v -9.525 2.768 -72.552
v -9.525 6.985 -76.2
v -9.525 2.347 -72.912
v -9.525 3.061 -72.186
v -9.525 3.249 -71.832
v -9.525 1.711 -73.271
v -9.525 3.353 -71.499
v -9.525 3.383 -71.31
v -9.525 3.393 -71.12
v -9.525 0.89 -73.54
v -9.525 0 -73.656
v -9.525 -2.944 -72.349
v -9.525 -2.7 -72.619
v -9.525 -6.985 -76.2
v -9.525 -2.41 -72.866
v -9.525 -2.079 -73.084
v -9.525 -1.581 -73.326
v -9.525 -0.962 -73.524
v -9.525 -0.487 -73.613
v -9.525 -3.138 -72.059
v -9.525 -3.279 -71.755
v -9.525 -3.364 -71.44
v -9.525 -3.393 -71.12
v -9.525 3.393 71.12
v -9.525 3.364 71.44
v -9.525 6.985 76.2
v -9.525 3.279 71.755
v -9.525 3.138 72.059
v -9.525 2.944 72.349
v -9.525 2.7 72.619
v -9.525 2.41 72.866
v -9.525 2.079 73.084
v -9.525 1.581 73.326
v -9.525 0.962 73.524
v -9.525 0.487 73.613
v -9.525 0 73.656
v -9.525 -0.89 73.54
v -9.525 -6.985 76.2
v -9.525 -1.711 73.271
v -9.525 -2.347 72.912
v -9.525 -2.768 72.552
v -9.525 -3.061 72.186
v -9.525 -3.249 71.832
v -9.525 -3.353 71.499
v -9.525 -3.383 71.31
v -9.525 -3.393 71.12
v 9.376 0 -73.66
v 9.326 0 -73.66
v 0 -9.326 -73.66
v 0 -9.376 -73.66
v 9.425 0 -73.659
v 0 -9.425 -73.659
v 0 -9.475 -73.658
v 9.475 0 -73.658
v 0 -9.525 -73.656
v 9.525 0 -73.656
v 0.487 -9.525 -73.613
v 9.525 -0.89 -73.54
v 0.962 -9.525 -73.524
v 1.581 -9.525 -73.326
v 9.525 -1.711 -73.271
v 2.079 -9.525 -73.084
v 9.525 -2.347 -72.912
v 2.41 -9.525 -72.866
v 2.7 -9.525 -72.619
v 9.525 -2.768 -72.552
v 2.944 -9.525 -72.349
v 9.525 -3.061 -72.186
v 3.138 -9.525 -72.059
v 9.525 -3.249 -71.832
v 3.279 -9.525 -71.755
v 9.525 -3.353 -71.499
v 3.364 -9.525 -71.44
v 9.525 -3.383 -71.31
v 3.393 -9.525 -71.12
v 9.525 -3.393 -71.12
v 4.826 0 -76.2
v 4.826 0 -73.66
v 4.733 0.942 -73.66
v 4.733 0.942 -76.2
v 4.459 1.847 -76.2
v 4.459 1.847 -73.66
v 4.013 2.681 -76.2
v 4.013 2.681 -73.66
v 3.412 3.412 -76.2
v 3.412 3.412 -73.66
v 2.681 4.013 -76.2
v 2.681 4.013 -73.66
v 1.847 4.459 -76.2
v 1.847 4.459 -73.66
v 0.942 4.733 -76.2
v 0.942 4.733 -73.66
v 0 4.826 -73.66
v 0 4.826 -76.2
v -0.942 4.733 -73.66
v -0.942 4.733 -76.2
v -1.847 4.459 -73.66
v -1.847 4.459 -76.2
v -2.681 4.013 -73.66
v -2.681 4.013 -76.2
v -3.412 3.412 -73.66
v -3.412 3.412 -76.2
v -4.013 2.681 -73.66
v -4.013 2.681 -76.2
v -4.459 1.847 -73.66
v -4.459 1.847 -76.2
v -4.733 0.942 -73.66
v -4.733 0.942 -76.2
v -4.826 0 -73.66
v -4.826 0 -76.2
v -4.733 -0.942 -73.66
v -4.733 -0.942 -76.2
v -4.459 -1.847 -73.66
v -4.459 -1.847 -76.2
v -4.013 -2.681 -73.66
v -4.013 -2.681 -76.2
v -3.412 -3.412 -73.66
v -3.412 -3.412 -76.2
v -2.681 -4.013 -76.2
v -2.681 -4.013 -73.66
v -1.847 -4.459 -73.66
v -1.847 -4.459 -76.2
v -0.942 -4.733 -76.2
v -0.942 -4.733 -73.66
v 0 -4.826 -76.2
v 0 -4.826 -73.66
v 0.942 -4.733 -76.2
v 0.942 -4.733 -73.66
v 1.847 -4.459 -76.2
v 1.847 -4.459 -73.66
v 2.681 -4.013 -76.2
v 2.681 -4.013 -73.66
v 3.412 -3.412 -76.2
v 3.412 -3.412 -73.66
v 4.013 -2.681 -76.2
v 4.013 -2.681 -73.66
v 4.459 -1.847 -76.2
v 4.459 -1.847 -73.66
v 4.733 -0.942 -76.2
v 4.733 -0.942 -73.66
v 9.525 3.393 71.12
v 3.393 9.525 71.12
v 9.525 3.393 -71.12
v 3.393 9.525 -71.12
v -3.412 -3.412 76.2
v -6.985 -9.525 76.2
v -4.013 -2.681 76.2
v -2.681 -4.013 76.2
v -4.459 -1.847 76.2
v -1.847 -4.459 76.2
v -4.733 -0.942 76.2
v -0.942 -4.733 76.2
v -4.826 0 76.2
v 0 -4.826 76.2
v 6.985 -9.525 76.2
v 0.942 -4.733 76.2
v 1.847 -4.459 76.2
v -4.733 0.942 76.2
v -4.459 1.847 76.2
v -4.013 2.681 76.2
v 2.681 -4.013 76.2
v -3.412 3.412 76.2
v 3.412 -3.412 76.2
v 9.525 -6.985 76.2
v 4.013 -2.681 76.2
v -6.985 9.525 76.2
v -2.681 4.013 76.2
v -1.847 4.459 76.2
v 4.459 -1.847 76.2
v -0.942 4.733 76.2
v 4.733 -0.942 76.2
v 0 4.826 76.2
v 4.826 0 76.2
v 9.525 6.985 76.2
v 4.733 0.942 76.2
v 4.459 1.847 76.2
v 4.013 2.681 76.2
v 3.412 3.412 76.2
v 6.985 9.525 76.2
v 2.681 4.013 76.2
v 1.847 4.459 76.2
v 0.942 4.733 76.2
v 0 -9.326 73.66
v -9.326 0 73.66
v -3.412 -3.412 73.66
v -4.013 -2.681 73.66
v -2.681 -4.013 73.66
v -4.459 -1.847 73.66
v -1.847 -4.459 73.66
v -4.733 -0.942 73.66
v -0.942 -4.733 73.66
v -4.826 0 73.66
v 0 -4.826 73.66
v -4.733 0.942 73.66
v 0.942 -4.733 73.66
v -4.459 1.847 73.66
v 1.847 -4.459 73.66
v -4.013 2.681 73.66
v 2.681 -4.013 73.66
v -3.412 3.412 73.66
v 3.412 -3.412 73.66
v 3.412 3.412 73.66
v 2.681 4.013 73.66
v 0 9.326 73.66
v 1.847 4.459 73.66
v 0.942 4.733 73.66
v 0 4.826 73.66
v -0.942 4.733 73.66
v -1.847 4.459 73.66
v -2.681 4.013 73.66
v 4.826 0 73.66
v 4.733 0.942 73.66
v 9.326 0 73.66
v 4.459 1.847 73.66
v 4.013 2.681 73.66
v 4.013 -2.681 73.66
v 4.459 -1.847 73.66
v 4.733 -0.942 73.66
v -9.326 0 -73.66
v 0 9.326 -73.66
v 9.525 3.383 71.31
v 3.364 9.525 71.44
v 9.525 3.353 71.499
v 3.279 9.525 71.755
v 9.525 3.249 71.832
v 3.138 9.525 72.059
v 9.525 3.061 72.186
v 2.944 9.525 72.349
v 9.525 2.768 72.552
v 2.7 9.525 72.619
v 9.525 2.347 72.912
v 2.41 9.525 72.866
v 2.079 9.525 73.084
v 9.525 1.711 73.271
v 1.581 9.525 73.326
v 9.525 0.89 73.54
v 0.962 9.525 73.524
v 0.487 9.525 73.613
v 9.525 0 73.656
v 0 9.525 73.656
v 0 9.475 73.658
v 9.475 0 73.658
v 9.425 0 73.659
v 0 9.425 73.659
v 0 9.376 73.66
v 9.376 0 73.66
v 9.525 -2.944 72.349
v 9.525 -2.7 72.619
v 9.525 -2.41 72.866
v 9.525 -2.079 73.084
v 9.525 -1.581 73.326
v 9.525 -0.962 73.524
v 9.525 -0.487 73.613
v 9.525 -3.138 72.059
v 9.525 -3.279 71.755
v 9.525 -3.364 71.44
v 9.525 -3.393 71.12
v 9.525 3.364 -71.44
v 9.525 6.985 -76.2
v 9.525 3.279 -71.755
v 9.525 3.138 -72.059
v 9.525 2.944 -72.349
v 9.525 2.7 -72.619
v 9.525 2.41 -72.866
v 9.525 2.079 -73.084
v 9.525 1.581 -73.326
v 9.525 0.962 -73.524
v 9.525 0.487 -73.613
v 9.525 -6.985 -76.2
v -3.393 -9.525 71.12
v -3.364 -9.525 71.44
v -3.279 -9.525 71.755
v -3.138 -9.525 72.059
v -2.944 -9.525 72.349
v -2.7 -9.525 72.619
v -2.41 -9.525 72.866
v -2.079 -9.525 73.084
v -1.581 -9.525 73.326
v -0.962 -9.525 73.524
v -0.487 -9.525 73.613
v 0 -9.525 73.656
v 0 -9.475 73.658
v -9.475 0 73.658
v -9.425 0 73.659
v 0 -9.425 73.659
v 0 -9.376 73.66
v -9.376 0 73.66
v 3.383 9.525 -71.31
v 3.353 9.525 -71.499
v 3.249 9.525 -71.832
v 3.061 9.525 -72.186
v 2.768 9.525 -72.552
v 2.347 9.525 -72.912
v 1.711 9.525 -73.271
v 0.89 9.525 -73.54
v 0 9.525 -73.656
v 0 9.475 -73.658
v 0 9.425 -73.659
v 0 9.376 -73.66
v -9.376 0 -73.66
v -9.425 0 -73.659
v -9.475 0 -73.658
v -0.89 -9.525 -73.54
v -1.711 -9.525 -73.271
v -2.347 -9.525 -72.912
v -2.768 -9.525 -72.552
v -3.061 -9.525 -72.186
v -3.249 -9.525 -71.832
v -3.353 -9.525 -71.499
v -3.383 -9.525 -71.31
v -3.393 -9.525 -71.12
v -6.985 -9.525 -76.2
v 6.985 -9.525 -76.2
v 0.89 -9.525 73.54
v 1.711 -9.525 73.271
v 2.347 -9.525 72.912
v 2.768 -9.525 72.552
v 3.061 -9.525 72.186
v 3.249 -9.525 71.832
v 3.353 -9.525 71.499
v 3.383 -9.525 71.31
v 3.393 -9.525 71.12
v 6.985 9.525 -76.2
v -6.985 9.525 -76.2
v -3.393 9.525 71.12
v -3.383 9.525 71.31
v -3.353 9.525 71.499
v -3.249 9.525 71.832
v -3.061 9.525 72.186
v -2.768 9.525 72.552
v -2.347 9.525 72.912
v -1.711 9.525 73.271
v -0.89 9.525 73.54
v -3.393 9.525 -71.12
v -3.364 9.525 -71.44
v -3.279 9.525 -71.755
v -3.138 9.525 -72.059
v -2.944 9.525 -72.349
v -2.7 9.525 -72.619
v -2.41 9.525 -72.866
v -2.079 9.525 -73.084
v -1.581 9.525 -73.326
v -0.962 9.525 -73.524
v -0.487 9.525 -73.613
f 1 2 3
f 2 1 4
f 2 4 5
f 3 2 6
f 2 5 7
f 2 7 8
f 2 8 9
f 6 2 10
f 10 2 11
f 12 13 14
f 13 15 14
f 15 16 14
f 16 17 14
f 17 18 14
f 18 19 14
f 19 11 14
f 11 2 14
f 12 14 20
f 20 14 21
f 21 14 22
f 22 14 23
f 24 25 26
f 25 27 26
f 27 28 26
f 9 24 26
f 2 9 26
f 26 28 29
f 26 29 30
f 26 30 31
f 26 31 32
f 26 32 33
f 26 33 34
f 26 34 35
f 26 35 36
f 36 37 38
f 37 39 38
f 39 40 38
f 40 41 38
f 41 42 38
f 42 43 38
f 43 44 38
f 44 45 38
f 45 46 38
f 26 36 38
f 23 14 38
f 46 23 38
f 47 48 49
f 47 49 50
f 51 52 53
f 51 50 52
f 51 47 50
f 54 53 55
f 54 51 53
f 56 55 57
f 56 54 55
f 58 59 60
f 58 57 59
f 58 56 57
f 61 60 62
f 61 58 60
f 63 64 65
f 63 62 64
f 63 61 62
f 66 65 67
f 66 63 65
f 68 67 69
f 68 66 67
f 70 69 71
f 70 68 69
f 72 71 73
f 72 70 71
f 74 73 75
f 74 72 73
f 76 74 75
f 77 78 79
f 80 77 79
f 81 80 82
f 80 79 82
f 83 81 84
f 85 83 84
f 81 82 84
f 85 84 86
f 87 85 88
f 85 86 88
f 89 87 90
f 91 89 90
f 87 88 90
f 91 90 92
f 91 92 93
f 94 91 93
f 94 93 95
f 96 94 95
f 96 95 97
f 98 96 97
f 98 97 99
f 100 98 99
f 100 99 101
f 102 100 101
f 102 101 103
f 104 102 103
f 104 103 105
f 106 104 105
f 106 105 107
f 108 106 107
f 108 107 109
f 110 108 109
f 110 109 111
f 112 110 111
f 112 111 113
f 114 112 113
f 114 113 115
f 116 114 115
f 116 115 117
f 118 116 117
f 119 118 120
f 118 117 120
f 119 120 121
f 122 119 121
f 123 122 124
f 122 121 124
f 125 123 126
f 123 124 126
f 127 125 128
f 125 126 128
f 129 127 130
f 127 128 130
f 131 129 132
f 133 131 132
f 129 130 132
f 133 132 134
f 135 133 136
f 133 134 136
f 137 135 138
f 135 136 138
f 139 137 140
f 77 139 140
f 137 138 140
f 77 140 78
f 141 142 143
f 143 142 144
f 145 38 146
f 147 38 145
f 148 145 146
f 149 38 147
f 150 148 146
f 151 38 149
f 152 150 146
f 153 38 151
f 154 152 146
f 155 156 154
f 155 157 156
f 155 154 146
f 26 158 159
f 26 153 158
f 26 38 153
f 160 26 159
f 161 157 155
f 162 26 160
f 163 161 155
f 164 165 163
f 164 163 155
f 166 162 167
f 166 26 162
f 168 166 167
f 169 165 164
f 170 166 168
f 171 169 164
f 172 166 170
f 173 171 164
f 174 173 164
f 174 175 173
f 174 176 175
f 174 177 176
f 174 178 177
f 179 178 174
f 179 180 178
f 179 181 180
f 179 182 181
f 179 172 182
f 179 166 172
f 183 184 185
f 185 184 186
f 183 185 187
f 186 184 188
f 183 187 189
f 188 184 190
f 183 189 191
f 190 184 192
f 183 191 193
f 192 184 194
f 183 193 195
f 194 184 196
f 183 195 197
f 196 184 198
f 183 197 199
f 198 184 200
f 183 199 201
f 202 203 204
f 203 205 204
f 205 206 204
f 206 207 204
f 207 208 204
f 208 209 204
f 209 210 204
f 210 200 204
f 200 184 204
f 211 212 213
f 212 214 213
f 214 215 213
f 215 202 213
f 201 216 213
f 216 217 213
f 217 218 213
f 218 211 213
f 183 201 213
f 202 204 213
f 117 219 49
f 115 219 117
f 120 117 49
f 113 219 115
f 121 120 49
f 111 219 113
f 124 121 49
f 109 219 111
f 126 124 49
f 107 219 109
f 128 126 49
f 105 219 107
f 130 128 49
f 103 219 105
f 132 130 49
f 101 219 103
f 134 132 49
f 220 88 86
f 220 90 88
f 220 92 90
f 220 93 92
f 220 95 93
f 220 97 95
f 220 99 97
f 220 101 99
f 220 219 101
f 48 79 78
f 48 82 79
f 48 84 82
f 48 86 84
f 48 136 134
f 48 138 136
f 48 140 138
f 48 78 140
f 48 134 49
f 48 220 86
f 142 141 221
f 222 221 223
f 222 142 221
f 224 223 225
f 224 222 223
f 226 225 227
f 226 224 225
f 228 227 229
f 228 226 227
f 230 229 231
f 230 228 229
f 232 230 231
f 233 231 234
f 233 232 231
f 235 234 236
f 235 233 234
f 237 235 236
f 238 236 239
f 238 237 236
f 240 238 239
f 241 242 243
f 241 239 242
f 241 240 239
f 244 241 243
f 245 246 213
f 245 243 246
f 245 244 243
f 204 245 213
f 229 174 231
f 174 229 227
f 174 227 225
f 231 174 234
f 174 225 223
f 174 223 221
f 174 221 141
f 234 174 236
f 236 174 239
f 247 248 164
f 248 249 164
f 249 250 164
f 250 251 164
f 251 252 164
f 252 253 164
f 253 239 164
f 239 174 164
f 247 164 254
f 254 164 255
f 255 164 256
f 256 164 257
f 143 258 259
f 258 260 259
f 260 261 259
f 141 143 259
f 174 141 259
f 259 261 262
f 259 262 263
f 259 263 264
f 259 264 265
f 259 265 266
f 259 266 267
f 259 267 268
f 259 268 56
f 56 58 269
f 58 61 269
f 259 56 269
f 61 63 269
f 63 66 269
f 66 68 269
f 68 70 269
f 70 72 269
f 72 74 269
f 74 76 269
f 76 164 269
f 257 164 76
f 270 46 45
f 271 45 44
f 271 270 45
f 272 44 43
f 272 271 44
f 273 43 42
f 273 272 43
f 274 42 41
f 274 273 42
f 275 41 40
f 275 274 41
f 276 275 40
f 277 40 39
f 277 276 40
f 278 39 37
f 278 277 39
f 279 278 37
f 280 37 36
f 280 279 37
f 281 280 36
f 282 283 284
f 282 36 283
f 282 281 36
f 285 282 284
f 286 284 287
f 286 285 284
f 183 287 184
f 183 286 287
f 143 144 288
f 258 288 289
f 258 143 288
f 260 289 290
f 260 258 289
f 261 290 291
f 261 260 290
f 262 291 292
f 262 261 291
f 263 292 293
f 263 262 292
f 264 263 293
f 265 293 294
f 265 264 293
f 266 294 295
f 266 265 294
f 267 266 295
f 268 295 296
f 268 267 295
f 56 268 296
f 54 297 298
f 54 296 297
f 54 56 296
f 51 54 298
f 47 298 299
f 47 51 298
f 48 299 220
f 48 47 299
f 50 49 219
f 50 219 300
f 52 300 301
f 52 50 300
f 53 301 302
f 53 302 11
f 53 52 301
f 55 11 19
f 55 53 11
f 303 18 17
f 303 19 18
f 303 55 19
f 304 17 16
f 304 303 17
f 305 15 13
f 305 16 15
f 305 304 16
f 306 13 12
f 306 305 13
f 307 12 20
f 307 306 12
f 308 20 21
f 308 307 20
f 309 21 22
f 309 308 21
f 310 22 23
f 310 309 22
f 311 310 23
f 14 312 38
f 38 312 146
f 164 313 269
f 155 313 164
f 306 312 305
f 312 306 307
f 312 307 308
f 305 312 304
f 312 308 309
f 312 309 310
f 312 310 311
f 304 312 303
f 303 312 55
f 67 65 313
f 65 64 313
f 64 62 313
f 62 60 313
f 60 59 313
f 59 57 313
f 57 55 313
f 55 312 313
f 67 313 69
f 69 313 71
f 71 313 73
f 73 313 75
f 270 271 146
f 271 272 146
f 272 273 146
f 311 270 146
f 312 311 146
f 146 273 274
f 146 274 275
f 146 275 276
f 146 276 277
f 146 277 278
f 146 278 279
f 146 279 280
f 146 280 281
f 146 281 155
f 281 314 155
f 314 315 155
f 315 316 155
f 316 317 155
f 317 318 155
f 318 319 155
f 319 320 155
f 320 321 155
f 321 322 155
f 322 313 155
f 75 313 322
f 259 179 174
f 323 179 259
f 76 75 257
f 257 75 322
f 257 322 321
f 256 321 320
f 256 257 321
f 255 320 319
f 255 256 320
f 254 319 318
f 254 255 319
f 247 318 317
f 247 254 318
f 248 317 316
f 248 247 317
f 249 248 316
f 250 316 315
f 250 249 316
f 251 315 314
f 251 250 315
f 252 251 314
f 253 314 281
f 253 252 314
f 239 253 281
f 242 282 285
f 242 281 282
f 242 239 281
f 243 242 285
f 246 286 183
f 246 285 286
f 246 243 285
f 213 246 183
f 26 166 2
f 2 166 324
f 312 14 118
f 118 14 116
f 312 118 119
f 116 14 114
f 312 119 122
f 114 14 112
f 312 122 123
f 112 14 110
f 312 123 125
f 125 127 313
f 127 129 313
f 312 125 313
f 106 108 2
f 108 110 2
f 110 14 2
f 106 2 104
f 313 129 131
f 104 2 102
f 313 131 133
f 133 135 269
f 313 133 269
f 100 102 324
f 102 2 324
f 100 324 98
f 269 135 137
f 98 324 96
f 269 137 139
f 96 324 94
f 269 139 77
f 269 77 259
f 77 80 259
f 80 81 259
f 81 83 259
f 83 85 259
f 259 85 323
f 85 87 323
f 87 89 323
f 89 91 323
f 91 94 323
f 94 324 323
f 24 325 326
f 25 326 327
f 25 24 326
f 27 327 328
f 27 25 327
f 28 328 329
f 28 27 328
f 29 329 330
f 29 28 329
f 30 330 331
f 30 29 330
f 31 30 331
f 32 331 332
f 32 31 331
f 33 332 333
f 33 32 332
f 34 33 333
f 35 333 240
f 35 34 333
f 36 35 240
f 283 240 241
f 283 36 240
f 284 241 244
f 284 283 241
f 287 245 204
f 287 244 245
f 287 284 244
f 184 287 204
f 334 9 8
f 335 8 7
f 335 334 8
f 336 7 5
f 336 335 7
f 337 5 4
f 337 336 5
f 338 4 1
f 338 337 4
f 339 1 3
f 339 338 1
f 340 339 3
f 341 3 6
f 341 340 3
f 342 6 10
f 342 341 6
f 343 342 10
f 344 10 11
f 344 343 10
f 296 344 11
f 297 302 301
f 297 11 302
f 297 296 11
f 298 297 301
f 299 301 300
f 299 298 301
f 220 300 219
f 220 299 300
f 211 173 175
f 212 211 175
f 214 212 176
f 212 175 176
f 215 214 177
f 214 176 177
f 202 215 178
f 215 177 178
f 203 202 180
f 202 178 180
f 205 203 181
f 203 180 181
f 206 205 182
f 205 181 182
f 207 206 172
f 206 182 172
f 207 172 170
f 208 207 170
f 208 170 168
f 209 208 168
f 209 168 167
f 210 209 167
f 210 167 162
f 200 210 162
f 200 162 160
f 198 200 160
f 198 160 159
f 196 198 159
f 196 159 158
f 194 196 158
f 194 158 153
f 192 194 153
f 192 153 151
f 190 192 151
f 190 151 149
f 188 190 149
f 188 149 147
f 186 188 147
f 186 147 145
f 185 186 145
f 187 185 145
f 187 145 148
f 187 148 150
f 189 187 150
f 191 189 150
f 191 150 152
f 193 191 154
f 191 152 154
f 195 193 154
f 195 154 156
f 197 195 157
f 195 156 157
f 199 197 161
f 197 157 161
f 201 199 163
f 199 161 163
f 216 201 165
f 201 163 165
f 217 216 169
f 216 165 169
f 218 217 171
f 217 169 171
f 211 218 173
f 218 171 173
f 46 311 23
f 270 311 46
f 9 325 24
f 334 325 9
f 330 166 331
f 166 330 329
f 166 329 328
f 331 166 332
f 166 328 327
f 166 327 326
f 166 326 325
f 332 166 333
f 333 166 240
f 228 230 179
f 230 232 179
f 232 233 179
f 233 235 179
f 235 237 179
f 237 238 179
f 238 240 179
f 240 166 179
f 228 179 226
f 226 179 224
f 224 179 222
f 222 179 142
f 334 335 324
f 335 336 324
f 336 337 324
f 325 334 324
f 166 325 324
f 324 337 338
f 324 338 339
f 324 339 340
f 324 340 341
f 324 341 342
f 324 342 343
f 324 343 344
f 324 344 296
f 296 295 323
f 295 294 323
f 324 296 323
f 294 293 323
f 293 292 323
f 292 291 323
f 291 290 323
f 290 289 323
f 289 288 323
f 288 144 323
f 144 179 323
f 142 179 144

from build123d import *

# Parameters (mm, degrees)
SKETCH1_W           = 19.05
SKETCH1_H           = 19.05
BOSS_EXTRUDE1_DEPTH = 76.2
CHAMFER1_SIZE       = 2.54
SHELL1_T            = -2.54
FILLET1_R           = 2.54
SKETCH3_R           = 4.826
CUT_EXTRUDE1_DEPTH  = 153.9941543


with BuildPart() as part:
    # Sketch1 → Boss-Extrude1 (new, symmetric)
    with BuildSketch(Plane.XY):
        Rectangle(SKETCH1_W, SKETCH1_H)
    extrude(amount=BOSS_EXTRUDE1_DEPTH, both=True)

    # Chamfer1
    chamfer1_edges = [part.edges().sort_by_distance(p)[0] for p in [
        (9.525, -9.525, 0),
        (-9.525, -9.525, 0),
        (-9.525, 9.525, 0),
        (9.525, 9.525, 0),
    ]]
    chamfer(chamfer1_edges, length=CHAMFER1_SIZE)

    # Shell1
    shell1_openings = [part.faces().sort_by_distance(p)[0] for p in [
        (0, -9.525, 0),
        (-9.525, 0, 0),
        (0, 9.525, 0),
        (9.525, 0, 0),
    ]]
    offset(amount=SHELL1_T, openings=shell1_openings, kind=Kind.INTERSECTION)

    # Fillet1
    # the kernel refuses this fillet: 2.54 mm, written as the material it adds along each edge
    with BuildSketch(Plane(origin=(1.097230509, 14.015128061, -73.66), x_dir=(0.7071067811865476, -0.7071067811865476, 0), z_dir=(-0.7071067811865476, -0.7071067811865476, 0))) as fillet1_piece_1_section:
        with BuildLine():
            CenterArc((FILLET1_R, FILLET1_R), FILLET1_R, 180, 90)
            Line((0, FILLET1_R), (0, 0))
            Line((0, 0), (FILLET1_R, 0))
        make_face()
    fillet1_piece_1 = extrude(amount=21.372102448, mode=Mode.PRIVATE)
    fillet1_piece_1 = split(fillet1_piece_1, bisect_by=Plane(origin=(-9.525, 6.009158894, -73.121025702), z_dir=(1, 0, 0)), keep=Keep.TOP, mode=Mode.PRIVATE)
    fillet1_piece_1 = split(fillet1_piece_1, bisect_by=Plane(origin=(-6.009158894, 9.525, -73.121025702), z_dir=(0, -1, 0)), keep=Keep.TOP, mode=Mode.PRIVATE)
    add(fillet1_piece_1)
    with BuildSketch(Plane(origin=(14.015128061, 1.097230509, -73.66), x_dir=(-0.7071067811865476, 0.7071067811865476, 0), z_dir=(-0.7071067811865476, -0.7071067811865476, 0))) as fillet1_piece_2_section:
        with BuildLine():
            CenterArc((FILLET1_R, -FILLET1_R), FILLET1_R, 90, 90)
            Line((0, -FILLET1_R), (0, 0))
            Line((0, 0), (FILLET1_R, 0))
        make_face()
    fillet1_piece_2 = extrude(amount=21.372102448, mode=Mode.PRIVATE)
    fillet1_piece_2 = split(fillet1_piece_2, bisect_by=Plane(origin=(6.009158894, -9.525, -73.121025702), z_dir=(0, 1, 0)), keep=Keep.TOP, mode=Mode.PRIVATE)
    fillet1_piece_2 = split(fillet1_piece_2, bisect_by=Plane(origin=(9.525, -6.009158894, -73.121025702), z_dir=(-1, 0, 0)), keep=Keep.TOP, mode=Mode.PRIVATE)
    add(fillet1_piece_2)
    with BuildSketch(Plane(origin=(14.015128061, -1.097230509, -73.66), x_dir=(-0.7071067811865476, -0.7071067811865476, 0), z_dir=(-0.7071067811865476, 0.7071067811865476, 0))) as fillet1_piece_3_section:
        with BuildLine():
            CenterArc((FILLET1_R, FILLET1_R), FILLET1_R, 180, 90)
            Line((0, FILLET1_R), (0, 0))
            Line((0, 0), (FILLET1_R, 0))
        make_face()
    fillet1_piece_3 = extrude(amount=21.372102448, mode=Mode.PRIVATE)
    fillet1_piece_3 = split(fillet1_piece_3, bisect_by=Plane(origin=(9.525, 6.009158894, -73.121025702), z_dir=(-1, 0, 0)), keep=Keep.TOP, mode=Mode.PRIVATE)
    fillet1_piece_3 = split(fillet1_piece_3, bisect_by=Plane(origin=(6.009158894, 9.525, -73.121025702), z_dir=(0, -1, 0)), keep=Keep.TOP, mode=Mode.PRIVATE)
    add(fillet1_piece_3)
    with BuildSketch(Plane(origin=(1.097230509, -14.015128061, -73.66), x_dir=(0.7071067811865476, 0.7071067811865476, 0), z_dir=(-0.7071067811865476, 0.7071067811865476, 0))) as fillet1_piece_4_section:
        with BuildLine():
            CenterArc((FILLET1_R, -FILLET1_R), FILLET1_R, 90, 90)
            Line((0, -FILLET1_R), (0, 0))
            Line((0, 0), (FILLET1_R, 0))
        make_face()
    fillet1_piece_4 = extrude(amount=21.372102448, mode=Mode.PRIVATE)
    fillet1_piece_4 = split(fillet1_piece_4, bisect_by=Plane(origin=(-9.525, -6.009158894, -73.121025702), z_dir=(1, 0, 0)), keep=Keep.TOP, mode=Mode.PRIVATE)
    fillet1_piece_4 = split(fillet1_piece_4, bisect_by=Plane(origin=(-6.009158894, -9.525, -73.121025702), z_dir=(0, 1, 0)), keep=Keep.TOP, mode=Mode.PRIVATE)
    add(fillet1_piece_4)
    with BuildSketch(Plane(origin=(-14.015128061, -1.097230509, 73.66), x_dir=(0, 0, -1), z_dir=(0.7071067811865476, 0.7071067811865476, 0))) as fillet1_piece_5_section:
        with BuildLine():
            CenterArc((FILLET1_R, -FILLET1_R), FILLET1_R, 90, 90)
            Line((0, -FILLET1_R), (0, 0))
            Line((0, 0), (FILLET1_R, 0))
        make_face()
    fillet1_piece_5 = extrude(amount=21.372102448, mode=Mode.PRIVATE)
    fillet1_piece_5 = split(fillet1_piece_5, bisect_by=Plane(origin=(-9.525, 6.009158894, 73.121025702), z_dir=(1, 0, 0)), keep=Keep.TOP, mode=Mode.PRIVATE)
    fillet1_piece_5 = split(fillet1_piece_5, bisect_by=Plane(origin=(-6.009158894, 9.525, 73.121025702), z_dir=(0, -1, 0)), keep=Keep.TOP, mode=Mode.PRIVATE)
    add(fillet1_piece_5)
    with BuildSketch(Plane(origin=(-1.097230509, 14.015128061, 73.66), x_dir=(0, 0, -1), z_dir=(0.7071067811865476, -0.7071067811865476, 0))) as fillet1_piece_6_section:
        with BuildLine():
            CenterArc((FILLET1_R, -FILLET1_R), FILLET1_R, 90, 90)
            Line((0, -FILLET1_R), (0, 0))
            Line((0, 0), (FILLET1_R, 0))
        make_face()
    fillet1_piece_6 = extrude(amount=21.372102448, mode=Mode.PRIVATE)
    fillet1_piece_6 = split(fillet1_piece_6, bisect_by=Plane(origin=(9.525, 6.009158894, 73.121025702), z_dir=(-1, 0, 0)), keep=Keep.TOP, mode=Mode.PRIVATE)
    fillet1_piece_6 = split(fillet1_piece_6, bisect_by=Plane(origin=(6.009158894, 9.525, 73.121025702), z_dir=(0, -1, 0)), keep=Keep.TOP, mode=Mode.PRIVATE)
    add(fillet1_piece_6)
    with BuildSketch(Plane(origin=(14.015128061, 1.097230509, 73.66), x_dir=(-0.7071067811865476, 0.7071067811865476, 0), z_dir=(-0.7071067811865476, -0.7071067811865476, 0))) as fillet1_piece_7_section:
        with BuildLine():
            CenterArc((FILLET1_R, FILLET1_R), FILLET1_R, 180, 90)
            Line((0, FILLET1_R), (0, 0))
            Line((0, 0), (FILLET1_R, 0))
        make_face()
    fillet1_piece_7 = extrude(amount=21.372102448, mode=Mode.PRIVATE)
    fillet1_piece_7 = split(fillet1_piece_7, bisect_by=Plane(origin=(6.009158894, -9.525, 73.121025702), z_dir=(0, 1, 0)), keep=Keep.TOP, mode=Mode.PRIVATE)
    fillet1_piece_7 = split(fillet1_piece_7, bisect_by=Plane(origin=(9.525, -6.009158894, 73.121025702), z_dir=(-1, 0, 0)), keep=Keep.TOP, mode=Mode.PRIVATE)
    add(fillet1_piece_7)
    with BuildSketch(Plane(origin=(1.097230509, -14.015128061, 73.66), x_dir=(0.7071067811865476, 0.7071067811865476, 0), z_dir=(-0.7071067811865476, 0.7071067811865476, 0))) as fillet1_piece_8_section:
        with BuildLine():
            CenterArc((FILLET1_R, FILLET1_R), FILLET1_R, 180, 90)
            Line((0, FILLET1_R), (0, 0))
            Line((0, 0), (FILLET1_R, 0))
        make_face()
    fillet1_piece_8 = extrude(amount=21.372102448, mode=Mode.PRIVATE)
    fillet1_piece_8 = split(fillet1_piece_8, bisect_by=Plane(origin=(-9.525, -6.009158894, 73.121025702), z_dir=(1, 0, 0)), keep=Keep.TOP, mode=Mode.PRIVATE)
    fillet1_piece_8 = split(fillet1_piece_8, bisect_by=Plane(origin=(-6.009158894, -9.525, 73.121025702), z_dir=(0, 1, 0)), keep=Keep.TOP, mode=Mode.PRIVATE)
    add(fillet1_piece_8)

    # Sketch3 → Cut-Extrude1 (cut, through all)
    with BuildSketch(Plane.XY.offset(76.2)):
        Circle(SKETCH3_R)
    extrude(amount=-CUT_EXTRUDE1_DEPTH, mode=Mode.SUBTRACT)


solid = part.part
